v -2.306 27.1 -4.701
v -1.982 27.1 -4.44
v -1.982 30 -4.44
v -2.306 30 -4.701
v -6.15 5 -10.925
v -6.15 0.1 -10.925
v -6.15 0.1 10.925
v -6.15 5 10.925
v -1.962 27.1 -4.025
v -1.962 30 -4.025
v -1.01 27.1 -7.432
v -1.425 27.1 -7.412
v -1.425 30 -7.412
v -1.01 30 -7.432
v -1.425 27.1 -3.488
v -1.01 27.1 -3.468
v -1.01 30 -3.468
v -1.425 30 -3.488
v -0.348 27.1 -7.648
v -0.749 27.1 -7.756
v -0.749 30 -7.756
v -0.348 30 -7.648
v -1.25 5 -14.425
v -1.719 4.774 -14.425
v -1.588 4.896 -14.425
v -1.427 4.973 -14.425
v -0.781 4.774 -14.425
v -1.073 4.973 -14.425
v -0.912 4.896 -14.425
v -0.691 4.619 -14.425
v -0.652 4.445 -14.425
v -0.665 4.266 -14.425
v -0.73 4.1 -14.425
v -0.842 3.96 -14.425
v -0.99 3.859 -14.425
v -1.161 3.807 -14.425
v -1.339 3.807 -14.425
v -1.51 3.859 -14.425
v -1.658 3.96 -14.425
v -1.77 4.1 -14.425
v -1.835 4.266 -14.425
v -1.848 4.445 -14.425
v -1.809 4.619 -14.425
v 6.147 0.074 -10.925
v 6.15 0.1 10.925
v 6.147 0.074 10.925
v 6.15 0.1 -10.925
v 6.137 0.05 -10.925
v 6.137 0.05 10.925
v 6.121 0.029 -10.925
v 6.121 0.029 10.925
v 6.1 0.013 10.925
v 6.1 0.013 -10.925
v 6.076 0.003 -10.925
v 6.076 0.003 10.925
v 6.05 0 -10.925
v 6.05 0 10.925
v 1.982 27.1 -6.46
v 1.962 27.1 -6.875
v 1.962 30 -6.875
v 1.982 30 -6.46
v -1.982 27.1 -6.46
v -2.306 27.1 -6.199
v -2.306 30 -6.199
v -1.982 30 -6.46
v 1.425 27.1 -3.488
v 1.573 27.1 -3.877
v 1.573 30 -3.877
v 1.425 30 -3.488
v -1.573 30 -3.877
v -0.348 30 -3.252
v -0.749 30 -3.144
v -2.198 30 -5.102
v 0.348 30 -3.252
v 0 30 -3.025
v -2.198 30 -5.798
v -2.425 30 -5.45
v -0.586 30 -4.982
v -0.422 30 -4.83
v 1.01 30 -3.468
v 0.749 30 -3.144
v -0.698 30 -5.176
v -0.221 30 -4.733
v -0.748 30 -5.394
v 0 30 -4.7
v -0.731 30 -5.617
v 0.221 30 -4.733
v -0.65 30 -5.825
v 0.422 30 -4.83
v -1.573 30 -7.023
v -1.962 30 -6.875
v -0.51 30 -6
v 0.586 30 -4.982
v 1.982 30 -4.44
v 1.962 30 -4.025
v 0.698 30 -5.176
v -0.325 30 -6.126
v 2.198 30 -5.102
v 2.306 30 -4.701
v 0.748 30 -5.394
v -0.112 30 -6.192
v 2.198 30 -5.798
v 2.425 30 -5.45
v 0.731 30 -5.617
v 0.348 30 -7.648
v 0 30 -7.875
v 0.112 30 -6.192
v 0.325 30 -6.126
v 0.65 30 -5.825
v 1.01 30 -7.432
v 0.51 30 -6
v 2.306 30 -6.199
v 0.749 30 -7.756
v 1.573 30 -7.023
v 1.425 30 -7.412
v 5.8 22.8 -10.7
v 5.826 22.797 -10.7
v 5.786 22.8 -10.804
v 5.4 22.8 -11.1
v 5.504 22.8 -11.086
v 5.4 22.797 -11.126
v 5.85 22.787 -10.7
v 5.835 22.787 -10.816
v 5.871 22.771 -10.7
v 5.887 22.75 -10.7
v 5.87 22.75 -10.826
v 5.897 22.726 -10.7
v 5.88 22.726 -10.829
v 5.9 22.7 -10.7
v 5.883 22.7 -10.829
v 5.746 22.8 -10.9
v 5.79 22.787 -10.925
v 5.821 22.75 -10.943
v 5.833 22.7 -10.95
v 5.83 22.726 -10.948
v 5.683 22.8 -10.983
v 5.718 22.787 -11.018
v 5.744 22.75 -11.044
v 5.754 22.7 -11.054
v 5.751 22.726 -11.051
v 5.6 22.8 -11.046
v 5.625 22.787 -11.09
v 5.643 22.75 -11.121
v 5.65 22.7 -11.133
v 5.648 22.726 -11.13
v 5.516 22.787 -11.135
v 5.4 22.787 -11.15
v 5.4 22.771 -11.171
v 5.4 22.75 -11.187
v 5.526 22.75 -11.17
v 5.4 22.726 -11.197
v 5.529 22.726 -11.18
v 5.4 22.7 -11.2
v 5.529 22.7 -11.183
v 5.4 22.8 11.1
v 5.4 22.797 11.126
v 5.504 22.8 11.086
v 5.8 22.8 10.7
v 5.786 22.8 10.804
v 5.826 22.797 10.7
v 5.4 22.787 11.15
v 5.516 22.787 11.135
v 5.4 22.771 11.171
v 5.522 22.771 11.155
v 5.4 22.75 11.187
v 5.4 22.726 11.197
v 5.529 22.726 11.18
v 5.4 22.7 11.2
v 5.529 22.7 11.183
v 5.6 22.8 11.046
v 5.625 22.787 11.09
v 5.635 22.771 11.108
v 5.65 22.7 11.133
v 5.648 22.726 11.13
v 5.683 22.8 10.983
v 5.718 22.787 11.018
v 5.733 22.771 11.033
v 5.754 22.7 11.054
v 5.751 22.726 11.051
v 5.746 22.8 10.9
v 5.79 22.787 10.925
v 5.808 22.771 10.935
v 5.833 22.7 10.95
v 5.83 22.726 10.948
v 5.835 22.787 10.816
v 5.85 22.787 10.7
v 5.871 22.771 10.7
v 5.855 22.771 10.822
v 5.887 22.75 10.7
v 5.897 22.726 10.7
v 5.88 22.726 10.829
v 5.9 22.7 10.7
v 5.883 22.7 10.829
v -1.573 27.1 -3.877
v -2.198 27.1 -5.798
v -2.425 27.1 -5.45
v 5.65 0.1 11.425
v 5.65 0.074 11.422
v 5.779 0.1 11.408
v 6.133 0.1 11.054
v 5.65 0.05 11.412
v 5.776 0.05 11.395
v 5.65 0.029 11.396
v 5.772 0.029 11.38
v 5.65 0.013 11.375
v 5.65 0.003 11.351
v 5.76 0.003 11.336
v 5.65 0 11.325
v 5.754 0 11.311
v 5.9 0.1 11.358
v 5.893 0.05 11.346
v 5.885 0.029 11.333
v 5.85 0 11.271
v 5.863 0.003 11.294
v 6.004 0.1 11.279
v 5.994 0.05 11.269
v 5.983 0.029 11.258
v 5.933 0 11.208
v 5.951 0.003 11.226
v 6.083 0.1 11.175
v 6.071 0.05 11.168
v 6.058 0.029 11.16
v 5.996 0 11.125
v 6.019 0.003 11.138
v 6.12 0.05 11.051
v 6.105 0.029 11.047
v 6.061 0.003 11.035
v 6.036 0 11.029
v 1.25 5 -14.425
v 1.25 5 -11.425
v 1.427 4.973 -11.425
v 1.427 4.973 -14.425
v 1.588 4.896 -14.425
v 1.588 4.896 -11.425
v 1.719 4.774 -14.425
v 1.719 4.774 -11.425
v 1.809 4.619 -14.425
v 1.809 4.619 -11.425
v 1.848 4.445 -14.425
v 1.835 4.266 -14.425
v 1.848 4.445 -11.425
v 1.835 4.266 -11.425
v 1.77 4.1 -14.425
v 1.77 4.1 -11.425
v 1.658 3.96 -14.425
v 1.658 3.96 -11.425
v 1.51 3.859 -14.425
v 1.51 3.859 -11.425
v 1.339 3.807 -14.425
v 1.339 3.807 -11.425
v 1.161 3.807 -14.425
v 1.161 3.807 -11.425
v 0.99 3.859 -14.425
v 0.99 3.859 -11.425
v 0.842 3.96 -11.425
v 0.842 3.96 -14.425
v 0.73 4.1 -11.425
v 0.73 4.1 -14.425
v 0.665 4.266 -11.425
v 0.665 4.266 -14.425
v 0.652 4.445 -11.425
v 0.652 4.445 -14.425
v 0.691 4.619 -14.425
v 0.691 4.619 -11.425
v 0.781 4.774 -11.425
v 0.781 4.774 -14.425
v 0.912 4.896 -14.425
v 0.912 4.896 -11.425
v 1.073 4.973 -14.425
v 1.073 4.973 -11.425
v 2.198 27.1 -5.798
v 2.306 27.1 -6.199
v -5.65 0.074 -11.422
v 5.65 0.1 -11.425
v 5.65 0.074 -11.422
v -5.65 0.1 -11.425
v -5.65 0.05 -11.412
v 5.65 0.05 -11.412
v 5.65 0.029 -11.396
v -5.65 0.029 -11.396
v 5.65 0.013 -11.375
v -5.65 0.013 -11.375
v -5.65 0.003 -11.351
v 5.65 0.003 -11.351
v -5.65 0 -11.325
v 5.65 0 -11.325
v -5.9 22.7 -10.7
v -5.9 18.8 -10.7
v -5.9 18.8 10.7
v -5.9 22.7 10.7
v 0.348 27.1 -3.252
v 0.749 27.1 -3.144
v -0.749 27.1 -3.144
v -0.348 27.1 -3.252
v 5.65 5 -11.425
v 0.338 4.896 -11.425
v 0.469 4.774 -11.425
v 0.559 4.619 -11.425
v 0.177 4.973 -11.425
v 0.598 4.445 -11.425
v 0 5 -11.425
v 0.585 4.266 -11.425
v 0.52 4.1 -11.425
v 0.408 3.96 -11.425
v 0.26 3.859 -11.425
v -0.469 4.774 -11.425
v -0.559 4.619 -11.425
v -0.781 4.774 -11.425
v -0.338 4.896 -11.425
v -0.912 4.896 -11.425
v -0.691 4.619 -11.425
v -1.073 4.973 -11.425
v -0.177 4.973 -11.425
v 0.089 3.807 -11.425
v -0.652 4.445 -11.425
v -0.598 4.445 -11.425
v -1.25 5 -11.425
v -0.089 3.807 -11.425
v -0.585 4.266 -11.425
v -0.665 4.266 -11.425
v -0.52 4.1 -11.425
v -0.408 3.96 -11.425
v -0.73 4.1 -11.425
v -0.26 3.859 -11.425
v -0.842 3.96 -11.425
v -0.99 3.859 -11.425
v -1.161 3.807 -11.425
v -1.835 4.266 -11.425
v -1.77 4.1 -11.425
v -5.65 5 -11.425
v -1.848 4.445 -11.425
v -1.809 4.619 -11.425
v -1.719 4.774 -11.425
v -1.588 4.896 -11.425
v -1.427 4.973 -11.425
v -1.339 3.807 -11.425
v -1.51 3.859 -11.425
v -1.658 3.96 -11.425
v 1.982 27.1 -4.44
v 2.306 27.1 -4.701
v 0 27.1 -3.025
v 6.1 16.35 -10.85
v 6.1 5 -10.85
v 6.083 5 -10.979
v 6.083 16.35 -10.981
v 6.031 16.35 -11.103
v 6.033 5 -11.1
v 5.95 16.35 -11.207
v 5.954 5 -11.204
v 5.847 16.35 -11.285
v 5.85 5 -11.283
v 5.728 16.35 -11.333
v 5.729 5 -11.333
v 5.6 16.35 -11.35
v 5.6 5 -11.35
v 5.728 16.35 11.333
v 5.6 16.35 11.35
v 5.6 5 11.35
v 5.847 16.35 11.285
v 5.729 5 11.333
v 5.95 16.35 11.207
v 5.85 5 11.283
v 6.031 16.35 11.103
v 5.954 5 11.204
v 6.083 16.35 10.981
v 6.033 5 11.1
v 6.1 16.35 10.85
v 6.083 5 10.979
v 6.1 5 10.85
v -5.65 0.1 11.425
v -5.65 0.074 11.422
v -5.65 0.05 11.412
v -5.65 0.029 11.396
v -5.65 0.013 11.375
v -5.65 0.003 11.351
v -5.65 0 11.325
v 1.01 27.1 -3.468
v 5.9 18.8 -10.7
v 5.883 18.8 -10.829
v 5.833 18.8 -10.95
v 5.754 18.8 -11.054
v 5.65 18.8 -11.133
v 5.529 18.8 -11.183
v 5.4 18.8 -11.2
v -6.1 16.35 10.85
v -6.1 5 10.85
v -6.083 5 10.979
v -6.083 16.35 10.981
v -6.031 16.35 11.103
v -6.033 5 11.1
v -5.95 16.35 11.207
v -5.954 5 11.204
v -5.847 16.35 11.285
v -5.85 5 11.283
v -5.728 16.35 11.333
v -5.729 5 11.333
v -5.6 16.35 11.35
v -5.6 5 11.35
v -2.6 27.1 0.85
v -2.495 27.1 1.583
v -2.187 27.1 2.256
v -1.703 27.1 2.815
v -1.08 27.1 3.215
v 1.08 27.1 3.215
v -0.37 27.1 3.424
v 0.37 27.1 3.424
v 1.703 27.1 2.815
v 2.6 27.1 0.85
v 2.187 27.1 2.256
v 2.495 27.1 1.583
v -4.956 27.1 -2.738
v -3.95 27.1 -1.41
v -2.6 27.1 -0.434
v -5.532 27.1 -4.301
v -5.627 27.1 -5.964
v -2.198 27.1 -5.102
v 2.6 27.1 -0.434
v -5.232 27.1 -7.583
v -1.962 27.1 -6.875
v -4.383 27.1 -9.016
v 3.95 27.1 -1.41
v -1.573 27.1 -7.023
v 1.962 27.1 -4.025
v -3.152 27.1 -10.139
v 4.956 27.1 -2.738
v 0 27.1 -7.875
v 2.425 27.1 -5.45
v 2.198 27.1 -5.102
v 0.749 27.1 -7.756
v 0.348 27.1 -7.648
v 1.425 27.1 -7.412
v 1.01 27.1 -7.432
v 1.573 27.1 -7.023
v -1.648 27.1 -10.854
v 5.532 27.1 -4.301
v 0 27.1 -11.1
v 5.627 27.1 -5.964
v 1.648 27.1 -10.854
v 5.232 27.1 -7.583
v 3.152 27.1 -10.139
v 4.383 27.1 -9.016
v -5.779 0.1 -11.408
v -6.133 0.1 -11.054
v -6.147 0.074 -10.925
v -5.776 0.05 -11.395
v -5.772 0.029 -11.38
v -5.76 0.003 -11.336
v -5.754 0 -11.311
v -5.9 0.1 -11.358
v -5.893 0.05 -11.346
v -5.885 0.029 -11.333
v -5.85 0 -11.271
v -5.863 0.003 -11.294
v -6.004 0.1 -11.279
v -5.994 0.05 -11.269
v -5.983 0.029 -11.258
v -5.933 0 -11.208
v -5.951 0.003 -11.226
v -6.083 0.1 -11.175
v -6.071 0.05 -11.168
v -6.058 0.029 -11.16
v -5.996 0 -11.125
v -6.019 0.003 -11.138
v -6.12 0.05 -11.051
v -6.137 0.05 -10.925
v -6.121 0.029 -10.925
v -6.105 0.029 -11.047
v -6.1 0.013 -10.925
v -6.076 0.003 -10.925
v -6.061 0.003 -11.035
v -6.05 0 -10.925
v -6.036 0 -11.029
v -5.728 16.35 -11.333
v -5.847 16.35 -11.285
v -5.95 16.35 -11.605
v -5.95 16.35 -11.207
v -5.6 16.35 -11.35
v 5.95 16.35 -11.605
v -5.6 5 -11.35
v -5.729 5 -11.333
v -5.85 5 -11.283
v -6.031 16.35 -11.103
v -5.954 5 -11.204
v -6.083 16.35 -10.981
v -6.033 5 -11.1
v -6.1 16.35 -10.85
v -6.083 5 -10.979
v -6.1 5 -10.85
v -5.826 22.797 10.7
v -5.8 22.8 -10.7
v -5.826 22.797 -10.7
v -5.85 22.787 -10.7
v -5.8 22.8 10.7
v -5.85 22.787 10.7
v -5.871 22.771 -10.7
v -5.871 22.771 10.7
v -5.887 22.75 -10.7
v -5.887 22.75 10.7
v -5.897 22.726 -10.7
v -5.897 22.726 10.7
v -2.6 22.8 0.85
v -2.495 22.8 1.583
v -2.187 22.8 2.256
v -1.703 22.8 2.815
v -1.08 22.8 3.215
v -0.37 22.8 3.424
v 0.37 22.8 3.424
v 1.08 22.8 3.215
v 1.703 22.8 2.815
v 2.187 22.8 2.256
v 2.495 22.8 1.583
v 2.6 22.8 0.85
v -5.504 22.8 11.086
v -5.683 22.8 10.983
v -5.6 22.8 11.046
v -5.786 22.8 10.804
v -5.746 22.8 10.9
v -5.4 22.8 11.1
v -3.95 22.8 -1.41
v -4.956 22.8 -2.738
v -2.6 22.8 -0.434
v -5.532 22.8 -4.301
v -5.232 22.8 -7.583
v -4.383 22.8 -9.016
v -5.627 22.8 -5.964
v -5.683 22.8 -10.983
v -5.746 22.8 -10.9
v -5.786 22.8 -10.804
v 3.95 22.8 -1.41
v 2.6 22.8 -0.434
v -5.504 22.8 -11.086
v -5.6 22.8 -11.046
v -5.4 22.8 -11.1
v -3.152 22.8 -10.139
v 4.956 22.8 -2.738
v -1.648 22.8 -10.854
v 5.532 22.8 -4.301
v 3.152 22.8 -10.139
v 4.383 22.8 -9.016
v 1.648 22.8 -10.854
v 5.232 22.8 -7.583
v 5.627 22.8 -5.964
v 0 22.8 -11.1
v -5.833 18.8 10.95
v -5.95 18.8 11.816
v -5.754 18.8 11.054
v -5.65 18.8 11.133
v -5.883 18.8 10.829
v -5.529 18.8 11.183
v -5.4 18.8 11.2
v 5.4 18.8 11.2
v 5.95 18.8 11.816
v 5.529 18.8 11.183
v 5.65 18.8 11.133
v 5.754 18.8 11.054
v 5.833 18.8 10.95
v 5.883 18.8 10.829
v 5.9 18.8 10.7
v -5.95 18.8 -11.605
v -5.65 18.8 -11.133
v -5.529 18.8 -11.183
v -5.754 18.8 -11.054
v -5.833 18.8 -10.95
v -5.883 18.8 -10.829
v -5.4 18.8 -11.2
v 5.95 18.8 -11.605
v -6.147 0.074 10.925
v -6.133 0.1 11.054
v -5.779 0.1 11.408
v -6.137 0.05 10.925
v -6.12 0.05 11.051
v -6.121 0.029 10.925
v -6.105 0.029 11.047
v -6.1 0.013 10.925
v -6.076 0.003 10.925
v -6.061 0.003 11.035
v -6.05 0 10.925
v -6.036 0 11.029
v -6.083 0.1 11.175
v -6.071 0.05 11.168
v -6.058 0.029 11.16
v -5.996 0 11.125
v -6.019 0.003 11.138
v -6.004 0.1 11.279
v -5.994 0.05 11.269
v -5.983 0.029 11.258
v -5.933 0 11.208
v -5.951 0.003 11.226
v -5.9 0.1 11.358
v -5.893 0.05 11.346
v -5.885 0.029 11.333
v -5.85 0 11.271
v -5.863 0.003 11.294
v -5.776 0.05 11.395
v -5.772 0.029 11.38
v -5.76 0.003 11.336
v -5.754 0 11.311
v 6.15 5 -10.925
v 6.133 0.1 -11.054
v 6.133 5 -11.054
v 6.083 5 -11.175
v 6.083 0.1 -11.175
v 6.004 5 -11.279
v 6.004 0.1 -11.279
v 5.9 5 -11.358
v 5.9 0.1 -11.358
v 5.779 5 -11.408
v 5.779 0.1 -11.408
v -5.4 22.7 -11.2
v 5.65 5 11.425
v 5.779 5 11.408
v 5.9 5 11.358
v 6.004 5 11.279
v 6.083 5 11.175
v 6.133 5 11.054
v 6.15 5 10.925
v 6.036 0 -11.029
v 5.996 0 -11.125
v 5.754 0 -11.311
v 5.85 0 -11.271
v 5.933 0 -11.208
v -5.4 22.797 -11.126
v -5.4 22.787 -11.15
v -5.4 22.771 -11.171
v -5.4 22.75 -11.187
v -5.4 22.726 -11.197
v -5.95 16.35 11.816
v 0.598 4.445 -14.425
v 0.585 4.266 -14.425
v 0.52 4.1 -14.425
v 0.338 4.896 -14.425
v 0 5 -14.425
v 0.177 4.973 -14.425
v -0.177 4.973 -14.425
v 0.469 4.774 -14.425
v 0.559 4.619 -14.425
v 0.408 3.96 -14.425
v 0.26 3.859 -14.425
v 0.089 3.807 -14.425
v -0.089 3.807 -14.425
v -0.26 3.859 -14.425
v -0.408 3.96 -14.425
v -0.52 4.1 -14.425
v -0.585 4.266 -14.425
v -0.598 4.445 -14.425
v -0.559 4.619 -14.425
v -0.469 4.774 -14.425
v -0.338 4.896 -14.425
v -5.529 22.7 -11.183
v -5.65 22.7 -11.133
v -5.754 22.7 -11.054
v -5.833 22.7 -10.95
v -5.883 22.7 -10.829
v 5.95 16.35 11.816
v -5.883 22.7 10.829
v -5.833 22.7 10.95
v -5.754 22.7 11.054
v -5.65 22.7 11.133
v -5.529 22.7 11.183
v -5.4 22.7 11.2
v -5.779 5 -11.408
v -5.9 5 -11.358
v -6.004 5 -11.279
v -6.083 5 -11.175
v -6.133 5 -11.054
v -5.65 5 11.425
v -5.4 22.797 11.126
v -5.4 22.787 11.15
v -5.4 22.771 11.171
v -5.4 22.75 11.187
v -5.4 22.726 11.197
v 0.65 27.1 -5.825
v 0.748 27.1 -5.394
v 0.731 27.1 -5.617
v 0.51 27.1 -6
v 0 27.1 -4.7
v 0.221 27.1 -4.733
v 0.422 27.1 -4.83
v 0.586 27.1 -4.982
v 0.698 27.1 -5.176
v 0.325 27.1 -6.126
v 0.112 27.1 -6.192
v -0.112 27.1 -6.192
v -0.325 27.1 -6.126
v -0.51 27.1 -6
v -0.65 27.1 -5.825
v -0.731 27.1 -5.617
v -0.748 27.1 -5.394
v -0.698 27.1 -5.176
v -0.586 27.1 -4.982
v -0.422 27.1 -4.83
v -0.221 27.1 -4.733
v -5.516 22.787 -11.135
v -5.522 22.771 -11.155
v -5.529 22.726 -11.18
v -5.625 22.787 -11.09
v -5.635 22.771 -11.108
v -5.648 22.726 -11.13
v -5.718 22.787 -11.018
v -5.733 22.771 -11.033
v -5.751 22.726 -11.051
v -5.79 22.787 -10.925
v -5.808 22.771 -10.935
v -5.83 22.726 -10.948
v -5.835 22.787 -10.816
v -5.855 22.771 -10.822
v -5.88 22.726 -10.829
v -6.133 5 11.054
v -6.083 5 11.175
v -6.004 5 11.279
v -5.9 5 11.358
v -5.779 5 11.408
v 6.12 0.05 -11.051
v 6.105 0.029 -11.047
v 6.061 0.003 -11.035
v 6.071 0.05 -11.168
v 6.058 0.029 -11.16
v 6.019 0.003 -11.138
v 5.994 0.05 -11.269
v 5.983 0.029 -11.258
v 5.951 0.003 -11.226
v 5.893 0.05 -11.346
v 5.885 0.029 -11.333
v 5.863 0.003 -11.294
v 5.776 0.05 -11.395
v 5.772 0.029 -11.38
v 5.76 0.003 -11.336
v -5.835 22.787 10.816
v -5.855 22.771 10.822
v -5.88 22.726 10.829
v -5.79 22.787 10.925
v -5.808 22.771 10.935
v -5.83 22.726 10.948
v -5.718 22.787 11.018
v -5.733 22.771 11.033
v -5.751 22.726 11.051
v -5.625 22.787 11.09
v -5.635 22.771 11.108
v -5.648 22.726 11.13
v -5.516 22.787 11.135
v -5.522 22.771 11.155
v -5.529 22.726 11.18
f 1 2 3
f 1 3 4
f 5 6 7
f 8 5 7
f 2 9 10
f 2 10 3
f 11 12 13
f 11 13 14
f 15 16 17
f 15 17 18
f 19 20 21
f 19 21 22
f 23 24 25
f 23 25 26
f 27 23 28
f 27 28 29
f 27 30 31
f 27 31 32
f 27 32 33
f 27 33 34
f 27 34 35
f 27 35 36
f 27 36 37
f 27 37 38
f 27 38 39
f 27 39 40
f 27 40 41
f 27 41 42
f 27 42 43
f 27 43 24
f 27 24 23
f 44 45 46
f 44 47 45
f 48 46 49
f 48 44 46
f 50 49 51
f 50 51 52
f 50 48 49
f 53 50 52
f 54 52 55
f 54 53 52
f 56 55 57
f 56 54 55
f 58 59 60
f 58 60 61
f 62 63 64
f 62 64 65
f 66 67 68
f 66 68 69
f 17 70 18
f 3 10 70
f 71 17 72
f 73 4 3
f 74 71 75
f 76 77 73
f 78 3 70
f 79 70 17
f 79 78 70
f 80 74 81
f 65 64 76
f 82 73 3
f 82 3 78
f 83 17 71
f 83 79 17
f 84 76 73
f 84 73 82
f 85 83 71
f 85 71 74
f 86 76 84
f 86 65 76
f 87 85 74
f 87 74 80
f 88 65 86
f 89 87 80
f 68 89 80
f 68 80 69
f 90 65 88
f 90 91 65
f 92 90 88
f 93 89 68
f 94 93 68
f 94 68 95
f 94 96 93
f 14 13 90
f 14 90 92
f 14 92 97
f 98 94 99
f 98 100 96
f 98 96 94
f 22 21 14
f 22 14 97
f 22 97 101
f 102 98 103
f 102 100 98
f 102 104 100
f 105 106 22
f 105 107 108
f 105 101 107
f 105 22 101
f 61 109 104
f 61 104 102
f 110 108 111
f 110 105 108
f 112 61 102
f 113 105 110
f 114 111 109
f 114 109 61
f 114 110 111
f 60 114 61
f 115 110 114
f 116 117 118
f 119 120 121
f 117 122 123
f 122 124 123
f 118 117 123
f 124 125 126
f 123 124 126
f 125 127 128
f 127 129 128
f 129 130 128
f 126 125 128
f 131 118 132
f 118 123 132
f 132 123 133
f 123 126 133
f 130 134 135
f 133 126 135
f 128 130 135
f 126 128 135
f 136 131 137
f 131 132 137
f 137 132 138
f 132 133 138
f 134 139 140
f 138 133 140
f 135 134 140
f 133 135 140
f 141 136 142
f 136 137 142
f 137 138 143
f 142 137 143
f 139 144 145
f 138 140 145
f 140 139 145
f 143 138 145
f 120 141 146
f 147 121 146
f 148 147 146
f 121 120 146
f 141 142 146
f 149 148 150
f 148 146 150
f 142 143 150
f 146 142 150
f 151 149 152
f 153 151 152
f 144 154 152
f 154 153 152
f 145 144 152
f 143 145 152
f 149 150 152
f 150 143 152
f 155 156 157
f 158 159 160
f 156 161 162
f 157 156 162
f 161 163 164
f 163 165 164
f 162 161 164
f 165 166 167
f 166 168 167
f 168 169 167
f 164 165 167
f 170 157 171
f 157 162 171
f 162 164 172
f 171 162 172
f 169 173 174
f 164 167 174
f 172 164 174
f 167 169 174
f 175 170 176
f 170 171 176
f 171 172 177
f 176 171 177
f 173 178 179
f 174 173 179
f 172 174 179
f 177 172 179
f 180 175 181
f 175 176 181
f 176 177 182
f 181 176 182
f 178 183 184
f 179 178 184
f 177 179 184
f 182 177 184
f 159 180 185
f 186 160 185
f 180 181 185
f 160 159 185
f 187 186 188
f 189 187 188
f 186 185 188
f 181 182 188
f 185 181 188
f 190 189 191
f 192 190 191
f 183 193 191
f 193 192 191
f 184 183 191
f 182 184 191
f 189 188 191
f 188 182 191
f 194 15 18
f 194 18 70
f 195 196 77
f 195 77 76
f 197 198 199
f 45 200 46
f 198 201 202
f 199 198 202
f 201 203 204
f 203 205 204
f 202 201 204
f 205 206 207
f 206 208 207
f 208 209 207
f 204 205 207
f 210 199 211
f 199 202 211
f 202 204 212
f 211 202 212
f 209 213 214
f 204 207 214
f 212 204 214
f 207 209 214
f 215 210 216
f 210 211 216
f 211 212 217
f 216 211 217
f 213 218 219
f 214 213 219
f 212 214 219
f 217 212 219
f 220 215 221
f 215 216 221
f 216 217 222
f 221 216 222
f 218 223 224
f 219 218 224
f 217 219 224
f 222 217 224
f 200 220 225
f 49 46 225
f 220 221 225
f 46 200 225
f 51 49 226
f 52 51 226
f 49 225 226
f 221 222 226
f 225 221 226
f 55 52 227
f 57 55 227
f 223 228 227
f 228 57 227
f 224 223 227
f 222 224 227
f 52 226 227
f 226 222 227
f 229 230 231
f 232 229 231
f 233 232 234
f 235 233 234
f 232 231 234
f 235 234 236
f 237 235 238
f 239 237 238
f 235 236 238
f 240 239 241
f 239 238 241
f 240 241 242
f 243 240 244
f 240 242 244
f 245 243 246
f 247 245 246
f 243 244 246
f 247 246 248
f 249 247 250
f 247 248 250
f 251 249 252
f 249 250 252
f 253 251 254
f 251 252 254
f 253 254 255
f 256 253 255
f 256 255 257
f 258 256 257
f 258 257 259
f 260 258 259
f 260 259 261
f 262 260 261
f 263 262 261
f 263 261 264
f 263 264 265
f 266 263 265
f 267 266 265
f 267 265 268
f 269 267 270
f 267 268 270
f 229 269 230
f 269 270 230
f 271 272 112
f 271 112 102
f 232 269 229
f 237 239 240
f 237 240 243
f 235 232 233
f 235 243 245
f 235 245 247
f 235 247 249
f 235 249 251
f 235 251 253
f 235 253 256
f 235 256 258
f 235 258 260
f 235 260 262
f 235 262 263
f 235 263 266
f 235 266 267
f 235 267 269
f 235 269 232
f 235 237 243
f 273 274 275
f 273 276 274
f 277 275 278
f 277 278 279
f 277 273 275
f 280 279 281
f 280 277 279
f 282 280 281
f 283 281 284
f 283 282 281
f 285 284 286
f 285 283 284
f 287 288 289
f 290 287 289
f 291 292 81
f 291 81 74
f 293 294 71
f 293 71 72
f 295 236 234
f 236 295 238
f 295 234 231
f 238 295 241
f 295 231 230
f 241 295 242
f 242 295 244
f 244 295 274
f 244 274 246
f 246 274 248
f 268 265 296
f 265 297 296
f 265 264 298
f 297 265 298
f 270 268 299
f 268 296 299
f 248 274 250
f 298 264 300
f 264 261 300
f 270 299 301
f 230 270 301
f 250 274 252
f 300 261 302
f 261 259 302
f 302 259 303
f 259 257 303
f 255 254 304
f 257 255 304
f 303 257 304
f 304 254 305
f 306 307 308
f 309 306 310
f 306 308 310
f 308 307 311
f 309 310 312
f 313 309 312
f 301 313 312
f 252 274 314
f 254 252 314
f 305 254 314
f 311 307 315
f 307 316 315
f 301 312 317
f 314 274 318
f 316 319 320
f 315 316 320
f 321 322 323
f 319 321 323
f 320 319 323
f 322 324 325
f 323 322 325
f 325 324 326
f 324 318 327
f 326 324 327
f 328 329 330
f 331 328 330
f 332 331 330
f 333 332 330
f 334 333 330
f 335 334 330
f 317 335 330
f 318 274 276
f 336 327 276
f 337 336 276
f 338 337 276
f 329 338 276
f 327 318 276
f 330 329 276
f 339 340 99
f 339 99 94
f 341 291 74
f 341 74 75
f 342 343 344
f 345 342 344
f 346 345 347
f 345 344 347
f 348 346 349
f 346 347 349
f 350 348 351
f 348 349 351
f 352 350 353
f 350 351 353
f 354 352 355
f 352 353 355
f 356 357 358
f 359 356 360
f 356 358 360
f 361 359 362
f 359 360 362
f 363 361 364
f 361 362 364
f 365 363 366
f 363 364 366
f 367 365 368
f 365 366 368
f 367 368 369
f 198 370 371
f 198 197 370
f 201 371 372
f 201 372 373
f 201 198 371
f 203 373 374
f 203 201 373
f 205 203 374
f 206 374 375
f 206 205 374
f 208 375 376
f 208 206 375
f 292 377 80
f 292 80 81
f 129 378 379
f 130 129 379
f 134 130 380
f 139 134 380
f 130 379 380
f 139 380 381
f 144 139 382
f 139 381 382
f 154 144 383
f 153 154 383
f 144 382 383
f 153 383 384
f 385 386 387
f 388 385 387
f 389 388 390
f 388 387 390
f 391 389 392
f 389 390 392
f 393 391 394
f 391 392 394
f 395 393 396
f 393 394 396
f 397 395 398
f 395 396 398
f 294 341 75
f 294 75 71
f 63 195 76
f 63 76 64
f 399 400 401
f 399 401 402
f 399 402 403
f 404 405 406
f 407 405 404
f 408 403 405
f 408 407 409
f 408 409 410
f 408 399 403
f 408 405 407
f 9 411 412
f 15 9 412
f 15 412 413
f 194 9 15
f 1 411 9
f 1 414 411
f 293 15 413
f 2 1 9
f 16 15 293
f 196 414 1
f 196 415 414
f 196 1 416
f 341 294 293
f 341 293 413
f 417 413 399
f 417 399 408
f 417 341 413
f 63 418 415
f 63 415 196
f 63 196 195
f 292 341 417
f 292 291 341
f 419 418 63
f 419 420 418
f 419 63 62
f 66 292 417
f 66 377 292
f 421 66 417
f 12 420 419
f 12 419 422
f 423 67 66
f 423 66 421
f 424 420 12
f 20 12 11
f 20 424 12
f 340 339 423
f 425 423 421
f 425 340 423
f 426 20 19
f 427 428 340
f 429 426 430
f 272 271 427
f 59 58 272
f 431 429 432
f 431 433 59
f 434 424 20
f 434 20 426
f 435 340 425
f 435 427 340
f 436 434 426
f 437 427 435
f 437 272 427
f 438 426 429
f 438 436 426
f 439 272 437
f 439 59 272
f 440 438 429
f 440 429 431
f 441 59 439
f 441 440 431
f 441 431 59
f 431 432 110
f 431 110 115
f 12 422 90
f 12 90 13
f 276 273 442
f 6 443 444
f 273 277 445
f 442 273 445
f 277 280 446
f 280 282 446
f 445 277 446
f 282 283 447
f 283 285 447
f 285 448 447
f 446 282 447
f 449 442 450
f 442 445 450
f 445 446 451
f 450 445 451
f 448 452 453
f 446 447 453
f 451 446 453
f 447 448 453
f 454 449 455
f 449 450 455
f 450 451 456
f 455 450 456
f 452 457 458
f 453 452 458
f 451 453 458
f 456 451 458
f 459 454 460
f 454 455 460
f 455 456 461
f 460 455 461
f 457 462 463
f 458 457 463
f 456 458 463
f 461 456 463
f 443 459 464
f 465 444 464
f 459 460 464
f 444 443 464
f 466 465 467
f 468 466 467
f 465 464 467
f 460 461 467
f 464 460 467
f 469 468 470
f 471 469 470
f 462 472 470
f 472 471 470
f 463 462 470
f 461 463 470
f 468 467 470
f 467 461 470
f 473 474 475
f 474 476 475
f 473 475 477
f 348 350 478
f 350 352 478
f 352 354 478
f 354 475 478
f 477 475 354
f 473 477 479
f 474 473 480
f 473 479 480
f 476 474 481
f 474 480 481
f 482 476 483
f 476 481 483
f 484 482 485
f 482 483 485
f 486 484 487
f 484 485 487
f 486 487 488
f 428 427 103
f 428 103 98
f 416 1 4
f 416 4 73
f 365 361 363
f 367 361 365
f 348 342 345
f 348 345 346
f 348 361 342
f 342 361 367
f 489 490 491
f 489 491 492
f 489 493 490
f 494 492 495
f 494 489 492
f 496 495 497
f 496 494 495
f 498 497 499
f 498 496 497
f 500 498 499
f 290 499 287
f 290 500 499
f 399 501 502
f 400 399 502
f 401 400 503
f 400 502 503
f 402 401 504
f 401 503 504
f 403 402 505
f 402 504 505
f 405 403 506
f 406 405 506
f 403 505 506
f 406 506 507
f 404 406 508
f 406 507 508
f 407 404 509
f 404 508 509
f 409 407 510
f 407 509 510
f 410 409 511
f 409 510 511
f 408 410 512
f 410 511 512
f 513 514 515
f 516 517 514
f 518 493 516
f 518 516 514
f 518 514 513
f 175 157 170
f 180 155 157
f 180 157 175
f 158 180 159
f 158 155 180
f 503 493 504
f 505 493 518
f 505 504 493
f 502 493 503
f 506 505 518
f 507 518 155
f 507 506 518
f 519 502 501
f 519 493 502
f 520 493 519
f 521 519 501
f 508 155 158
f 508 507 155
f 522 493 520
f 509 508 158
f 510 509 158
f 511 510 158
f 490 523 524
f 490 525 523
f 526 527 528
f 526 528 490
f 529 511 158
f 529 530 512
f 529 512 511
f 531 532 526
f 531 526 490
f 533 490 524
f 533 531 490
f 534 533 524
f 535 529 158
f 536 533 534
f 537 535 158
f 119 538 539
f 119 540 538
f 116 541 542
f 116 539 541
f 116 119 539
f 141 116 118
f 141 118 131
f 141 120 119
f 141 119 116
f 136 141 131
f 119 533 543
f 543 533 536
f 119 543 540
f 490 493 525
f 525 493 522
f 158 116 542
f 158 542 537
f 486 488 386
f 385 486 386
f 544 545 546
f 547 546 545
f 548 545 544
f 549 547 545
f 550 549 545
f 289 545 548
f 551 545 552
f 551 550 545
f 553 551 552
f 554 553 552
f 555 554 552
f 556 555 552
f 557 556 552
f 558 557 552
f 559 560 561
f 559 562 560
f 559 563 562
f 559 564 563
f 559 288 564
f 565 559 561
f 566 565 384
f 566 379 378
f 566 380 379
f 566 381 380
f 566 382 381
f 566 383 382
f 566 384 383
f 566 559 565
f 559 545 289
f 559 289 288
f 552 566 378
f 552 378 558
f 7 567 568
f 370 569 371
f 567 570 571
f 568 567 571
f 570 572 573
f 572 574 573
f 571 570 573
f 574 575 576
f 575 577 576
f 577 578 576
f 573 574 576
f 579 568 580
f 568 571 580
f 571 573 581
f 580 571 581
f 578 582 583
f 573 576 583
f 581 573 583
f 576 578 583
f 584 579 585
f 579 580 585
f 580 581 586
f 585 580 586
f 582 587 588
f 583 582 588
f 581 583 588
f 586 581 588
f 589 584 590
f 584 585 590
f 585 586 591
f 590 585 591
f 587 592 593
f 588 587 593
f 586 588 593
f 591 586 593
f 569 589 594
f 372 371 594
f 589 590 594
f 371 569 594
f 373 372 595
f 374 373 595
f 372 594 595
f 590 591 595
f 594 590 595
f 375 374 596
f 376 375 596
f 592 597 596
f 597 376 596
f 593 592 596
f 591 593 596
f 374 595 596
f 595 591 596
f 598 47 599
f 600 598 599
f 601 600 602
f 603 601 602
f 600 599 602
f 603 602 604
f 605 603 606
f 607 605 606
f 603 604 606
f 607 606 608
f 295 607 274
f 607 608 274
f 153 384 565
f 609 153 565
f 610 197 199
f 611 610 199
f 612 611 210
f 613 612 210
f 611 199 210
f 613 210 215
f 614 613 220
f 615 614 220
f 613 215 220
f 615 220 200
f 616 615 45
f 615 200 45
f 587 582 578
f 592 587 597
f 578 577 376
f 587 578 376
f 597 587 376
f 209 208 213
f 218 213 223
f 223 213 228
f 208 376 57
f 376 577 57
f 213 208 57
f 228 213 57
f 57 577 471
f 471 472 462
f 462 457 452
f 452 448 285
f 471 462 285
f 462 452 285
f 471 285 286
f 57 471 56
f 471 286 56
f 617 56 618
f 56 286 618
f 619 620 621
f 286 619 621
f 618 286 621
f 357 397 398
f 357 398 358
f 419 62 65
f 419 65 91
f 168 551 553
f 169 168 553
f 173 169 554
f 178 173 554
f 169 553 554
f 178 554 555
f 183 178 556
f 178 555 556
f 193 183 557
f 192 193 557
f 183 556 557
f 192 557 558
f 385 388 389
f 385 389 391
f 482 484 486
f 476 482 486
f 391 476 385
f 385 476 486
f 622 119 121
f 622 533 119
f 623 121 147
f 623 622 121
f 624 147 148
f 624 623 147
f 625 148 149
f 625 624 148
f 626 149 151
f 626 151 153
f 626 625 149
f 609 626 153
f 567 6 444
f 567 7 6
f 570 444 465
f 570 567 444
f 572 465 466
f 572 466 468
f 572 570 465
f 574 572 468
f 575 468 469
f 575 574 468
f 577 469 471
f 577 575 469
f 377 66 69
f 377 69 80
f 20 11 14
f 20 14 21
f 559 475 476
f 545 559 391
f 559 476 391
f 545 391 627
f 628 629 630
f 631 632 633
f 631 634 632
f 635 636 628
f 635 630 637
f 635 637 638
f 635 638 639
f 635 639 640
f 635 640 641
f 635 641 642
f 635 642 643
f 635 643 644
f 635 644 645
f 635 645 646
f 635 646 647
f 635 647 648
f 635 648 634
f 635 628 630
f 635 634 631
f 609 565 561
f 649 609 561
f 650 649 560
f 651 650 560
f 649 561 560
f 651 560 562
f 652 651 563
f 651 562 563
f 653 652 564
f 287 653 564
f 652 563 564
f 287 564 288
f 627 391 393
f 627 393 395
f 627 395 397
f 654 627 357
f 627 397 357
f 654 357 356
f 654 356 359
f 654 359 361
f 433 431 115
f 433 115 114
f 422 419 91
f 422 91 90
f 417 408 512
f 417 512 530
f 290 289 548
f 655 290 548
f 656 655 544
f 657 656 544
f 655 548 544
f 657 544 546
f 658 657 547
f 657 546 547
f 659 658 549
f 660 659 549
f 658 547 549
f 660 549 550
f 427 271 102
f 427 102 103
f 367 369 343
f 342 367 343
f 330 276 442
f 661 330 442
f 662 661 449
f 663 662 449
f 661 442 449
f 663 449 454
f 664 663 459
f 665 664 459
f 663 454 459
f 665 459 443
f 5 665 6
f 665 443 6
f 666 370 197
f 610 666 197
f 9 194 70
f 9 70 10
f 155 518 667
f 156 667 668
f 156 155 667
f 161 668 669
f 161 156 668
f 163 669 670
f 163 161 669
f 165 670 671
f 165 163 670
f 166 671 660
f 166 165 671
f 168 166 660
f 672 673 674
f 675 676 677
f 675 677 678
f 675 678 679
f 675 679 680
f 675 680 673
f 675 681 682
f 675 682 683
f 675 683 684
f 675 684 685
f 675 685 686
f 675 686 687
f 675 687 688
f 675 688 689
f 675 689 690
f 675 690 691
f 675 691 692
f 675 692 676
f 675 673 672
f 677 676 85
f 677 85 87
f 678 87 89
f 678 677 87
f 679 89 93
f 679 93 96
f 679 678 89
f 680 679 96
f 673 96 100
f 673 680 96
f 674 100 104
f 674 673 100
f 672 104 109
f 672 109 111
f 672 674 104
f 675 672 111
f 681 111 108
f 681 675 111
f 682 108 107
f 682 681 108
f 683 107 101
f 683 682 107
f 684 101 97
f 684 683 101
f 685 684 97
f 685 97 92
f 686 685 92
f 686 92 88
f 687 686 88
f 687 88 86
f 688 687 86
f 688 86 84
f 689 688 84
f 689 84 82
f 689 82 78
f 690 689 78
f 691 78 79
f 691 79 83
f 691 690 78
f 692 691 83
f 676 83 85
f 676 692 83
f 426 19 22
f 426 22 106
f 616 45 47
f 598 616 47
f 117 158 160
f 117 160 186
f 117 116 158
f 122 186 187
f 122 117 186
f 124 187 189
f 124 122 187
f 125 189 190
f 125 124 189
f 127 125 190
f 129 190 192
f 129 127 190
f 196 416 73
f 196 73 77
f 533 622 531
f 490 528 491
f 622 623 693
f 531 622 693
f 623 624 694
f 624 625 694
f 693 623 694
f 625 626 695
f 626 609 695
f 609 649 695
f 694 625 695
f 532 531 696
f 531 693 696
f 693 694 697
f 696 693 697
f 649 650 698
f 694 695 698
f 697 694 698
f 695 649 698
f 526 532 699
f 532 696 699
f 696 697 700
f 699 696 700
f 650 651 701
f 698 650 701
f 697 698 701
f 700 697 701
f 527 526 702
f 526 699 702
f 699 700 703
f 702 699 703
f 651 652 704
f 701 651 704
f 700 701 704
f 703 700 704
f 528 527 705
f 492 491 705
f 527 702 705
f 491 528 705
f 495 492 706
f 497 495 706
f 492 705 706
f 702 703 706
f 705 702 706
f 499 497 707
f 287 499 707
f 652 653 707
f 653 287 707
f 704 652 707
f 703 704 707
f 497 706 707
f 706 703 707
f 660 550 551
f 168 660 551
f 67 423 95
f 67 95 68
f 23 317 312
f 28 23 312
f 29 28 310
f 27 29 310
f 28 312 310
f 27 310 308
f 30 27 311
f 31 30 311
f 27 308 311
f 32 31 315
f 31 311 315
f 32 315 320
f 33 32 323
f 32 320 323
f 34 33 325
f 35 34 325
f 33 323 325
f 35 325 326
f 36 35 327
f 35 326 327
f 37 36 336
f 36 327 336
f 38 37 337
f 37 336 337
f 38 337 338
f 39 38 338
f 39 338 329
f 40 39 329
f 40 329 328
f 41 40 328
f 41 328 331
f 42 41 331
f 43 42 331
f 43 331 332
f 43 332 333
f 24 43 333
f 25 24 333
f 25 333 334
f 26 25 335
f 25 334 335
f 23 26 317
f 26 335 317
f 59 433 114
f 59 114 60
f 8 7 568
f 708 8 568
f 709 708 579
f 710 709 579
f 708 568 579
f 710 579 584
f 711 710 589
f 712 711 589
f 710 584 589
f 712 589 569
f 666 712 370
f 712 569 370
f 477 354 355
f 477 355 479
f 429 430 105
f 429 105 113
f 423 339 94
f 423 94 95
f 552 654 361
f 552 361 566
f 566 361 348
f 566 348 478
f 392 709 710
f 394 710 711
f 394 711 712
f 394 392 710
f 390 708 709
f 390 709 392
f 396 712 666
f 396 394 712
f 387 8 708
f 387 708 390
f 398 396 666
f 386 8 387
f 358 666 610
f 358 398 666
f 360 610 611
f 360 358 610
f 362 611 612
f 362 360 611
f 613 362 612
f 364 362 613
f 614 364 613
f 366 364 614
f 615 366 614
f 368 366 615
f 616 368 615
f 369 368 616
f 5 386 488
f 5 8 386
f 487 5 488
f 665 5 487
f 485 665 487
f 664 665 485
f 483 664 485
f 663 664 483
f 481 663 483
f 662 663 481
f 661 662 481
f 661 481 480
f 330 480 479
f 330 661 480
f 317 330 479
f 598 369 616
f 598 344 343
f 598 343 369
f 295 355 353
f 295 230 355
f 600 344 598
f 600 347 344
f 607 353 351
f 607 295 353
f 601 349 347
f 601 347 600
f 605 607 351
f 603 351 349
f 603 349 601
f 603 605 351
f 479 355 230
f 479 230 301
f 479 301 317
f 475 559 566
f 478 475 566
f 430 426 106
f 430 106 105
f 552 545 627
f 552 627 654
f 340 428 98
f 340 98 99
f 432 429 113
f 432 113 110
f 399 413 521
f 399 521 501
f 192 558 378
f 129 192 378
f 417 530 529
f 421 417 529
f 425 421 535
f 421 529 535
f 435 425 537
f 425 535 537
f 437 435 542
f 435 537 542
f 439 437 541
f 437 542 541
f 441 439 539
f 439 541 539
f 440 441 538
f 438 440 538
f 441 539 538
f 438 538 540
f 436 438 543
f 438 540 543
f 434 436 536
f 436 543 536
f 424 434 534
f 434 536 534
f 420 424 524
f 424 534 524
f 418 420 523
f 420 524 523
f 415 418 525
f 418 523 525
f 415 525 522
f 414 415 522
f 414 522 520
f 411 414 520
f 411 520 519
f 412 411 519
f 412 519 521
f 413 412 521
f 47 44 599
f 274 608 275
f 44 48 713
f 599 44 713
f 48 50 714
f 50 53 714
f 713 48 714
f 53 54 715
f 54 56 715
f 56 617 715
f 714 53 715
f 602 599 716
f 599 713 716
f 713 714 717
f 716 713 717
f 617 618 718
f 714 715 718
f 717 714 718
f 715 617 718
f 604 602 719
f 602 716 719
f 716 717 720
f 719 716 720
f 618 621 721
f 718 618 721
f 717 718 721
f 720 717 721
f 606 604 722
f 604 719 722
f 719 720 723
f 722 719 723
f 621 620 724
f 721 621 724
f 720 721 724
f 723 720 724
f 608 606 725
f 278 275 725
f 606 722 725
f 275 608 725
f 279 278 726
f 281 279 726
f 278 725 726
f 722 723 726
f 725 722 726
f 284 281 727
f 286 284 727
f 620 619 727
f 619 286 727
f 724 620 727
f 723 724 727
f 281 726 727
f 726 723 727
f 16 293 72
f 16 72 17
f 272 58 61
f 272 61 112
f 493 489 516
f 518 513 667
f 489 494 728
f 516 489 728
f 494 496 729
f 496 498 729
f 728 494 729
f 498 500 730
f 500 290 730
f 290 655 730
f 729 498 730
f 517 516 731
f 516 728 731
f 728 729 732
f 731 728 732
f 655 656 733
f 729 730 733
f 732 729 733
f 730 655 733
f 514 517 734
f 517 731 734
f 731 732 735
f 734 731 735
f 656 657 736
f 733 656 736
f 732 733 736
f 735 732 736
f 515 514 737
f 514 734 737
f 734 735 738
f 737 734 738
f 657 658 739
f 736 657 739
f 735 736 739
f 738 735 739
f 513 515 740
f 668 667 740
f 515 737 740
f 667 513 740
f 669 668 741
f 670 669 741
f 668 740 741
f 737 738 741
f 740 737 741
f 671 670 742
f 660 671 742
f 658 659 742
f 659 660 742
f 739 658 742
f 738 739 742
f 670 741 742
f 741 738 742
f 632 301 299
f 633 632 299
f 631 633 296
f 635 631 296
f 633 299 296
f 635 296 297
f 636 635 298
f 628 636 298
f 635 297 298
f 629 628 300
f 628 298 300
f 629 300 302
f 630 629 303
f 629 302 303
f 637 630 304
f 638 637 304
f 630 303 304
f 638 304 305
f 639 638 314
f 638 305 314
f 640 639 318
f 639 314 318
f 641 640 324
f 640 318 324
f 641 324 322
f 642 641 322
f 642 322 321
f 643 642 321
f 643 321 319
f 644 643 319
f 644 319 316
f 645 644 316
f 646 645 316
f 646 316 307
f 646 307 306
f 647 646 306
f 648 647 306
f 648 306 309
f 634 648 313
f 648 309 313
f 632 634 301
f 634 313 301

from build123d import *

# Parameters (mm, degrees)
Y_KSEKLIK_EKSTR_ZYON1_DEPTH = 5
Y_KSEKLIK_EKSTR_ZYON2_DEPTH = 11.35
Y_KSEKLIK_EKSTR_ZYON3_DEPTH = 2.45
Y_KSEKLIK_EKSTR_ZYON4_DEPTH = 4
IZIM5_R                     = 5.65
Y_KSEKLIK_EKSTR_ZYON5_DEPTH = 4.3
IZIM7_R                     = 0.75
Y_KSEKLIK_EKSTR_ZYON6_DEPTH = 2.9
RADYUS1_R                   = 0.1
IZIM8_R                     = 0.6
Y_KSEKLIK_EKSTR_ZYON7_DEPTH = 3
SKETCH1_OUTSIDE_W           = 23.446
SKETCH1_OUTSIDE_H           = 43.396
SKETCH1_OUTSIDE_W_2         = 11.9
SKETCH1_OUTSIDE_H_2         = 23.420918094
CUT_EXTRUDE1_DEPTH          = 2.45


with BuildPart() as part:
    # Çizim1 → Yükseklik-Ekstrüzyon1 (new body)
    with BuildSketch(Plane(origin=(0, 0, 0), x_dir=(1, 0, 0), z_dir=(0, 1, 0))):
        with BuildLine():
            Line((-5.65, -11.425), (5.65, -11.425))
            ThreePointArc((5.65, -11.425), (6.003553391, -11.278553391), (6.15, -10.925))
            Line((6.15, -10.925), (6.15, 10.925))
            ThreePointArc((6.15, 10.925), (6.003553391, 11.278553391), (5.65, 11.425))
            Line((5.65, 11.425), (-5.65, 11.425))
            ThreePointArc((-5.65, 11.425), (-6.003553391, 11.278553391), (-6.15, 10.925))
            Line((-6.15, 10.925), (-6.15, -10.925))
            ThreePointArc((-6.15, -10.925), (-6.003553391, -11.278553391), (-5.65, -11.425))
        make_face()
    extrude(amount=Y_KSEKLIK_EKSTR_ZYON1_DEPTH)

    # Çizim2 → Yükseklik-Ekstrüzyon2 (add)
    with BuildSketch(Plane(origin=(0, 5, 0), x_dir=(1, 0, 0), z_dir=(0, 1, 0))):
        with BuildLine():
            Line((-5.6, -11.35), (5.6, -11.35))
            ThreePointArc((5.6, -11.35), (5.953553391, -11.203553391), (6.1, -10.85))
            Line((6.1, -10.85), (6.1, 10.85))
            ThreePointArc((6.1, 10.85), (5.953553391, 11.203553391), (5.6, 11.35))
            Line((5.6, 11.35), (-5.6, 11.35))
            ThreePointArc((-5.6, 11.35), (-5.953553391, 11.203553391), (-6.1, 10.85))
            Line((-6.1, 10.85), (-6.1, -10.85))
            ThreePointArc((-6.1, -10.85), (-5.953553391, -11.203553391), (-5.6, -11.35))
        make_face()
    extrude(amount=Y_KSEKLIK_EKSTR_ZYON2_DEPTH)

    # Çizim3 → Yükseklik-Ekstrüzyon3 (add)
    with BuildSketch(Plane(origin=(0, 16.35, 0), x_dir=(1, 0, 0), z_dir=(0, 1, 0))):
        with BuildLine():
            Line((-5.95, 15.625), (-5.95, 11.207071421))
            ThreePointArc((-5.95, 11.207071421), (-5.789029481, 11.31289076), (-5.6, 11.35))
            Line((-5.6, 11.35), (5.6, 11.35))
            ThreePointArc((5.6, 11.35), (5.789029481, 11.31289076), (5.95, 11.207071421))
            Line((5.95, 11.207071421), (5.95, 15.625))
            ThreePointArc((5.95, 15.625), (5.803553391, 15.978553391), (5.45, 16.125))
            Line((5.45, 16.125), (0.5, 16.125))
            Line((0.5, 16.125), (0.5, 14.991025404))
            ThreePointArc((0.5, 14.991025404), (0, 13.125), (-0.5, 14.991025404))
            Line((-0.5, 14.991025404), (-0.5, 16.125))
            Line((-0.5, 16.125), (-5.45, 16.125))
            ThreePointArc((-5.45, 16.125), (-5.803553391, 15.978553391), (-5.95, 15.625))
        make_face()
        with BuildLine():
            Line((-5.95, 11.207071421), (-5.95, -11.207071421))
            ThreePointArc((-5.95, -11.207071421), (-5.789029481, -11.31289076), (-5.6, -11.35))
            Line((-5.6, -11.35), (5.6, -11.35))
            ThreePointArc((5.6, -11.35), (5.789029481, -11.31289076), (5.95, -11.207071421))
            Line((5.95, -11.207071421), (5.95, 11.207071421))
            ThreePointArc((5.95, 11.207071421), (5.789029481, 11.31289076), (5.6, 11.35))
            Line((5.6, 11.35), (-5.6, 11.35))
            ThreePointArc((-5.6, 11.35), (-5.789029481, 11.31289076), (-5.95, 11.207071421))
        make_face()
        with BuildLine():
            ThreePointArc((-5.95, -15.625), (-5.803553391, -15.978553391), (-5.45, -16.125))
            Line((-5.45, -16.125), (-0.5, -16.125))
            Line((-0.5, -16.125), (-0.5, -14.991025404))
            ThreePointArc((-0.5, -14.991025404), (0, -13.125), (0.5, -14.991025404))
            Line((0.5, -14.991025404), (0.5, -16.125))
            Line((0.5, -16.125), (5.45, -16.125))
            ThreePointArc((5.45, -16.125), (5.803553391, -15.978553391), (5.95, -15.625))
            Line((5.95, -15.625), (5.95, -11.207071421))
            ThreePointArc((5.95, -11.207071421), (5.789029481, -11.31289076), (5.6, -11.35))
            Line((5.6, -11.35), (-5.6, -11.35))
            ThreePointArc((-5.6, -11.35), (-5.789029481, -11.31289076), (-5.95, -11.207071421))
            Line((-5.95, -11.207071421), (-5.95, -15.625))
        make_face()
    extrude(amount=Y_KSEKLIK_EKSTR_ZYON3_DEPTH)

    # Çizim4 → Yükseklik-Ekstrüzyon4 (add)
    with BuildSketch(Plane(origin=(0, 18.8, 0), x_dir=(1, 0, 0), z_dir=(0, 1, 0))):
        with BuildLine():
            Line((-5.4, -11.2), (5.4, -11.2))
            ThreePointArc((5.4, -11.2), (5.753553391, -11.053553391), (5.9, -10.7))
            Line((5.9, -10.7), (5.9, 10.7))
            ThreePointArc((5.9, 10.7), (5.753553391, 11.053553391), (5.4, 11.2))
            Line((5.4, 11.2), (-5.4, 11.2))
            ThreePointArc((-5.4, 11.2), (-5.753553391, 11.053553391), (-5.9, 10.7))
            Line((-5.9, 10.7), (-5.9, -10.7))
            ThreePointArc((-5.9, -10.7), (-5.753553391, -11.053553391), (-5.4, -11.2))
        make_face()
    extrude(amount=Y_KSEKLIK_EKSTR_ZYON4_DEPTH)

    # Çizim5 → Yükseklik-Ekstrüzyon5 (add)
    with BuildSketch(Plane(origin=(0, 22.8, 0), x_dir=(1, 0, 0), z_dir=(0, 1, 0))):
        with Locations((0, 5.45)):
            Circle(IZIM5_R)
        with BuildLine():
            ThreePointArc((-2.6, -0.85), (0, -3.45), (2.6, -0.85))
            Line((2.6, -0.85), (2.6, 0.433776321))
            ThreePointArc((2.6, 0.433776321), (0, -0.2), (-2.6, 0.433776321))
            Line((-2.6, 0.433776321), (-2.6, -0.85))
        make_face()
    extrude(amount=Y_KSEKLIK_EKSTR_ZYON5_DEPTH)

    # Çizim7 → Yükseklik-Ekstrüzyon6 (add)
    # profile 1 of 21: a face of its own
    with BuildSketch(Plane(origin=(0, 27.1, 0), x_dir=(1, 0, 0), z_dir=(0, 1, 0))):
        Polygon((1.982489516, 6.460128862), (1.573312588, 7.023312588), (1.010128862, 7.432489516), (0.348066685, 7.647606558), (-0.348066685, 7.647606558), (-1.010128862, 7.432489516), (-1.573312588, 7.023312588), (-1.982489516, 6.460128862), (-2.197606558, 5.798066685), (-2.197606558, 5.101933315), (-1.982489516, 4.439871138), (-1.573312588, 3.876687412), (-1.010128862, 3.467510484), (-0.348066685, 3.252393442), (0.348066685, 3.252393442), (1.010128862, 3.467510484), (1.573312588, 3.876687412), (1.982489516, 4.439871138), (2.197606558, 5.101933315), (2.197606558, 5.798066685), align=None)
        with Locations(Location((0, 5.45, 0), (0, 0, 270))):
            Circle(IZIM7_R, mode=Mode.SUBTRACT)
    # profile 2 of 21: a face of its own
    with BuildSketch(Plane(origin=(0, 27.1, 0), x_dir=(1, 0, 0), z_dir=(0, 1, 0))):
        Polygon((-0.749366211, 7.756312052), (-0.348066685, 7.647606558), (-1.010128862, 7.432489516), align=None)
    # profile 3 of 21: a face of its own
    with BuildSketch(Plane(origin=(0, 27.1, 0), x_dir=(1, 0, 0), z_dir=(0, 1, 0))):
        Polygon((0, 7.875), (0.348066685, 7.647606558), (-0.348066685, 7.647606558), align=None)
    # profile 4 of 21: a face of its own
    with BuildSketch(Plane(origin=(0, 27.1, 0), x_dir=(1, 0, 0), z_dir=(0, 1, 0))):
        Polygon((-1.425379237, 7.411866211), (-1.010128862, 7.432489516), (-1.573312588, 7.023312588), align=None)
    # profile 5 of 21: a face of its own
    with BuildSketch(Plane(origin=(0, 27.1, 0), x_dir=(1, 0, 0), z_dir=(0, 1, 0))):
        Polygon((-1.961866211, 6.875379237), (-1.573312588, 7.023312588), (-1.982489516, 6.460128862), align=None)
    # profile 6 of 21: a face of its own
    with BuildSketch(Plane(origin=(0, 27.1, 0), x_dir=(1, 0, 0), z_dir=(0, 1, 0))):
        Polygon((-2.306312052, 6.199366211), (-1.982489516, 6.460128862), (-2.197606558, 5.798066685), align=None)
    # profile 7 of 21: a face of its own
    with BuildSketch(Plane(origin=(0, 27.1, 0), x_dir=(1, 0, 0), z_dir=(0, 1, 0))):
        Polygon((-2.306312052, 4.700633789), (-2.197606558, 5.101933315), (-1.982489516, 4.439871138), align=None)
    # profile 8 of 21: a face of its own
    with BuildSketch(Plane(origin=(0, 27.1, 0), x_dir=(1, 0, 0), z_dir=(0, 1, 0))):
        Polygon((-2.425, 5.45), (-2.197606558, 5.798066685), (-2.197606558, 5.101933315), align=None)
    # profile 9 of 21: a face of its own
    with BuildSketch(Plane(origin=(0, 27.1, 0), x_dir=(1, 0, 0), z_dir=(0, 1, 0))):
        Polygon((-1.961866211, 4.024620763), (-1.982489516, 4.439871138), (-1.573312588, 3.876687412), align=None)
    # profile 10 of 21: a face of its own
    with BuildSketch(Plane(origin=(0, 27.1, 0), x_dir=(1, 0, 0), z_dir=(0, 1, 0))):
        Polygon((-1.425379237, 3.488133789), (-1.573312588, 3.876687412), (-1.010128862, 3.467510484), align=None)
    # profile 11 of 21: a face of its own
    with BuildSketch(Plane(origin=(0, 27.1, 0), x_dir=(1, 0, 0), z_dir=(0, 1, 0))):
        Polygon((-0.749366211, 3.143687948), (-1.010128862, 3.467510484), (-0.348066685, 3.252393442), align=None)
    # profile 12 of 21: a face of its own
    with BuildSketch(Plane(origin=(0, 27.1, 0), x_dir=(1, 0, 0), z_dir=(0, 1, 0))):
        Polygon((0, 3.025), (-0.348066685, 3.252393442), (0.348066685, 3.252393442), align=None)
    # profile 13 of 21: a face of its own
    with BuildSketch(Plane(origin=(0, 27.1, 0), x_dir=(1, 0, 0), z_dir=(0, 1, 0))):
        Polygon((0.749366211, 3.143687948), (0.348066685, 3.252393442), (1.010128862, 3.467510484), align=None)
    # profile 14 of 21: a face of its own
    with BuildSketch(Plane(origin=(0, 27.1, 0), x_dir=(1, 0, 0), z_dir=(0, 1, 0))):
        Polygon((0.749366211, 7.756312052), (1.010128862, 7.432489516), (0.348066685, 7.647606558), align=None)
    # profile 15 of 21: a face of its own
    with BuildSketch(Plane(origin=(0, 27.1, 0), x_dir=(1, 0, 0), z_dir=(0, 1, 0))):
        Polygon((1.425379237, 7.411866211), (1.573312588, 7.023312588), (1.010128862, 7.432489516), align=None)
    # profile 16 of 21: a face of its own
    with BuildSketch(Plane(origin=(0, 27.1, 0), x_dir=(1, 0, 0), z_dir=(0, 1, 0))):
        Polygon((1.961866211, 6.875379237), (1.982489516, 6.460128862), (1.573312588, 7.023312588), align=None)
    # profile 17 of 21: a face of its own
    with BuildSketch(Plane(origin=(0, 27.1, 0), x_dir=(1, 0, 0), z_dir=(0, 1, 0))):
        Polygon((2.306312052, 6.199366211), (2.197606558, 5.798066685), (1.982489516, 6.460128862), align=None)
    # profile 18 of 21: a face of its own
    with BuildSketch(Plane(origin=(0, 27.1, 0), x_dir=(1, 0, 0), z_dir=(0, 1, 0))):
        Polygon((2.425, 5.45), (2.197606558, 5.101933315), (2.197606558, 5.798066685), align=None)
    # profile 19 of 21: a face of its own
    with BuildSketch(Plane(origin=(0, 27.1, 0), x_dir=(1, 0, 0), z_dir=(0, 1, 0))):
        Polygon((2.306312052, 4.700633789), (1.982489516, 4.439871138), (2.197606558, 5.101933315), align=None)
    # profile 20 of 21: a face of its own
    with BuildSketch(Plane(origin=(0, 27.1, 0), x_dir=(1, 0, 0), z_dir=(0, 1, 0))):
        Polygon((1.961866211, 4.024620763), (1.573312588, 3.876687412), (1.982489516, 4.439871138), align=None)
    # profile 21 of 21: a face of its own
    with BuildSketch(Plane(origin=(0, 27.1, 0), x_dir=(1, 0, 0), z_dir=(0, 1, 0))):
        Polygon((1.425379237, 3.488133789), (1.010128862, 3.467510484), (1.573312588, 3.876687412), align=None)
    extrude(amount=Y_KSEKLIK_EKSTR_ZYON6_DEPTH)

    # Radyus1
    radyus1_edges = [part.edges().sort_by_distance(p)[0] for p in [
        (0, 22.8, -11.2),
        (-5.753553391, 22.8, -11.053553391),
        (-5.9, 22.8, 0),
        (-5.753553391, 22.8, 11.053553391),
        (0, 0, 11.425),
        (0, 22.8, 11.2),
        (-6.003553391, 0, 11.278553391),
        (-6.15, 0, 0),
        (-6.003553391, 0, -11.278553391),
        (0, 0, -11.425),
        (6.003553391, 0, -11.278553391),
        (6.15, 0, 0),
        (6.003553391, 0, 11.278553391),
        (5.753553391, 22.8, 11.053553391),
        (5.9, 22.8, 0),
        (5.753553391, 22.8, -11.053553391),
    ]]
    fillet(radyus1_edges, radius=RADYUS1_R - 0.0001)  # a hair under: the kernel refuses the full size

    # Çizim8 → Yükseklik-Ekstrüzyon7 (add)
    with BuildSketch(Plane(origin=(0, 0, -11.425), x_dir=(-1, 0, 0), z_dir=(0, 0, -1))):
        with Locations(Location((-1.25, 4.4, 0), (0, 0, 90))):
            Circle(IZIM8_R)
        with Locations(Location((0, 4.4, 0), (0, 0, 90))):
            Circle(IZIM8_R)
        with Locations(Location((1.25, 4.4, 0), (0, 0, 90))):
            Circle(IZIM8_R)
    extrude(amount=Y_KSEKLIK_EKSTR_ZYON7_DEPTH)

    # Sketch1 outside → Cut-Extrude1 (cut)
    with BuildSketch(Plane(origin=(0, 18.8, 0), x_dir=(1, 0, 0), z_dir=(0, 1, 0))):
        Rectangle(SKETCH1_OUTSIDE_W, SKETCH1_OUTSIDE_H)
        with Locations((0, -0.105309884)):
            Rectangle(SKETCH1_OUTSIDE_W_2, SKETCH1_OUTSIDE_H_2, mode=Mode.SUBTRACT)
    extrude(amount=-CUT_EXTRUDE1_DEPTH, mode=Mode.SUBTRACT)


solid = part.part
